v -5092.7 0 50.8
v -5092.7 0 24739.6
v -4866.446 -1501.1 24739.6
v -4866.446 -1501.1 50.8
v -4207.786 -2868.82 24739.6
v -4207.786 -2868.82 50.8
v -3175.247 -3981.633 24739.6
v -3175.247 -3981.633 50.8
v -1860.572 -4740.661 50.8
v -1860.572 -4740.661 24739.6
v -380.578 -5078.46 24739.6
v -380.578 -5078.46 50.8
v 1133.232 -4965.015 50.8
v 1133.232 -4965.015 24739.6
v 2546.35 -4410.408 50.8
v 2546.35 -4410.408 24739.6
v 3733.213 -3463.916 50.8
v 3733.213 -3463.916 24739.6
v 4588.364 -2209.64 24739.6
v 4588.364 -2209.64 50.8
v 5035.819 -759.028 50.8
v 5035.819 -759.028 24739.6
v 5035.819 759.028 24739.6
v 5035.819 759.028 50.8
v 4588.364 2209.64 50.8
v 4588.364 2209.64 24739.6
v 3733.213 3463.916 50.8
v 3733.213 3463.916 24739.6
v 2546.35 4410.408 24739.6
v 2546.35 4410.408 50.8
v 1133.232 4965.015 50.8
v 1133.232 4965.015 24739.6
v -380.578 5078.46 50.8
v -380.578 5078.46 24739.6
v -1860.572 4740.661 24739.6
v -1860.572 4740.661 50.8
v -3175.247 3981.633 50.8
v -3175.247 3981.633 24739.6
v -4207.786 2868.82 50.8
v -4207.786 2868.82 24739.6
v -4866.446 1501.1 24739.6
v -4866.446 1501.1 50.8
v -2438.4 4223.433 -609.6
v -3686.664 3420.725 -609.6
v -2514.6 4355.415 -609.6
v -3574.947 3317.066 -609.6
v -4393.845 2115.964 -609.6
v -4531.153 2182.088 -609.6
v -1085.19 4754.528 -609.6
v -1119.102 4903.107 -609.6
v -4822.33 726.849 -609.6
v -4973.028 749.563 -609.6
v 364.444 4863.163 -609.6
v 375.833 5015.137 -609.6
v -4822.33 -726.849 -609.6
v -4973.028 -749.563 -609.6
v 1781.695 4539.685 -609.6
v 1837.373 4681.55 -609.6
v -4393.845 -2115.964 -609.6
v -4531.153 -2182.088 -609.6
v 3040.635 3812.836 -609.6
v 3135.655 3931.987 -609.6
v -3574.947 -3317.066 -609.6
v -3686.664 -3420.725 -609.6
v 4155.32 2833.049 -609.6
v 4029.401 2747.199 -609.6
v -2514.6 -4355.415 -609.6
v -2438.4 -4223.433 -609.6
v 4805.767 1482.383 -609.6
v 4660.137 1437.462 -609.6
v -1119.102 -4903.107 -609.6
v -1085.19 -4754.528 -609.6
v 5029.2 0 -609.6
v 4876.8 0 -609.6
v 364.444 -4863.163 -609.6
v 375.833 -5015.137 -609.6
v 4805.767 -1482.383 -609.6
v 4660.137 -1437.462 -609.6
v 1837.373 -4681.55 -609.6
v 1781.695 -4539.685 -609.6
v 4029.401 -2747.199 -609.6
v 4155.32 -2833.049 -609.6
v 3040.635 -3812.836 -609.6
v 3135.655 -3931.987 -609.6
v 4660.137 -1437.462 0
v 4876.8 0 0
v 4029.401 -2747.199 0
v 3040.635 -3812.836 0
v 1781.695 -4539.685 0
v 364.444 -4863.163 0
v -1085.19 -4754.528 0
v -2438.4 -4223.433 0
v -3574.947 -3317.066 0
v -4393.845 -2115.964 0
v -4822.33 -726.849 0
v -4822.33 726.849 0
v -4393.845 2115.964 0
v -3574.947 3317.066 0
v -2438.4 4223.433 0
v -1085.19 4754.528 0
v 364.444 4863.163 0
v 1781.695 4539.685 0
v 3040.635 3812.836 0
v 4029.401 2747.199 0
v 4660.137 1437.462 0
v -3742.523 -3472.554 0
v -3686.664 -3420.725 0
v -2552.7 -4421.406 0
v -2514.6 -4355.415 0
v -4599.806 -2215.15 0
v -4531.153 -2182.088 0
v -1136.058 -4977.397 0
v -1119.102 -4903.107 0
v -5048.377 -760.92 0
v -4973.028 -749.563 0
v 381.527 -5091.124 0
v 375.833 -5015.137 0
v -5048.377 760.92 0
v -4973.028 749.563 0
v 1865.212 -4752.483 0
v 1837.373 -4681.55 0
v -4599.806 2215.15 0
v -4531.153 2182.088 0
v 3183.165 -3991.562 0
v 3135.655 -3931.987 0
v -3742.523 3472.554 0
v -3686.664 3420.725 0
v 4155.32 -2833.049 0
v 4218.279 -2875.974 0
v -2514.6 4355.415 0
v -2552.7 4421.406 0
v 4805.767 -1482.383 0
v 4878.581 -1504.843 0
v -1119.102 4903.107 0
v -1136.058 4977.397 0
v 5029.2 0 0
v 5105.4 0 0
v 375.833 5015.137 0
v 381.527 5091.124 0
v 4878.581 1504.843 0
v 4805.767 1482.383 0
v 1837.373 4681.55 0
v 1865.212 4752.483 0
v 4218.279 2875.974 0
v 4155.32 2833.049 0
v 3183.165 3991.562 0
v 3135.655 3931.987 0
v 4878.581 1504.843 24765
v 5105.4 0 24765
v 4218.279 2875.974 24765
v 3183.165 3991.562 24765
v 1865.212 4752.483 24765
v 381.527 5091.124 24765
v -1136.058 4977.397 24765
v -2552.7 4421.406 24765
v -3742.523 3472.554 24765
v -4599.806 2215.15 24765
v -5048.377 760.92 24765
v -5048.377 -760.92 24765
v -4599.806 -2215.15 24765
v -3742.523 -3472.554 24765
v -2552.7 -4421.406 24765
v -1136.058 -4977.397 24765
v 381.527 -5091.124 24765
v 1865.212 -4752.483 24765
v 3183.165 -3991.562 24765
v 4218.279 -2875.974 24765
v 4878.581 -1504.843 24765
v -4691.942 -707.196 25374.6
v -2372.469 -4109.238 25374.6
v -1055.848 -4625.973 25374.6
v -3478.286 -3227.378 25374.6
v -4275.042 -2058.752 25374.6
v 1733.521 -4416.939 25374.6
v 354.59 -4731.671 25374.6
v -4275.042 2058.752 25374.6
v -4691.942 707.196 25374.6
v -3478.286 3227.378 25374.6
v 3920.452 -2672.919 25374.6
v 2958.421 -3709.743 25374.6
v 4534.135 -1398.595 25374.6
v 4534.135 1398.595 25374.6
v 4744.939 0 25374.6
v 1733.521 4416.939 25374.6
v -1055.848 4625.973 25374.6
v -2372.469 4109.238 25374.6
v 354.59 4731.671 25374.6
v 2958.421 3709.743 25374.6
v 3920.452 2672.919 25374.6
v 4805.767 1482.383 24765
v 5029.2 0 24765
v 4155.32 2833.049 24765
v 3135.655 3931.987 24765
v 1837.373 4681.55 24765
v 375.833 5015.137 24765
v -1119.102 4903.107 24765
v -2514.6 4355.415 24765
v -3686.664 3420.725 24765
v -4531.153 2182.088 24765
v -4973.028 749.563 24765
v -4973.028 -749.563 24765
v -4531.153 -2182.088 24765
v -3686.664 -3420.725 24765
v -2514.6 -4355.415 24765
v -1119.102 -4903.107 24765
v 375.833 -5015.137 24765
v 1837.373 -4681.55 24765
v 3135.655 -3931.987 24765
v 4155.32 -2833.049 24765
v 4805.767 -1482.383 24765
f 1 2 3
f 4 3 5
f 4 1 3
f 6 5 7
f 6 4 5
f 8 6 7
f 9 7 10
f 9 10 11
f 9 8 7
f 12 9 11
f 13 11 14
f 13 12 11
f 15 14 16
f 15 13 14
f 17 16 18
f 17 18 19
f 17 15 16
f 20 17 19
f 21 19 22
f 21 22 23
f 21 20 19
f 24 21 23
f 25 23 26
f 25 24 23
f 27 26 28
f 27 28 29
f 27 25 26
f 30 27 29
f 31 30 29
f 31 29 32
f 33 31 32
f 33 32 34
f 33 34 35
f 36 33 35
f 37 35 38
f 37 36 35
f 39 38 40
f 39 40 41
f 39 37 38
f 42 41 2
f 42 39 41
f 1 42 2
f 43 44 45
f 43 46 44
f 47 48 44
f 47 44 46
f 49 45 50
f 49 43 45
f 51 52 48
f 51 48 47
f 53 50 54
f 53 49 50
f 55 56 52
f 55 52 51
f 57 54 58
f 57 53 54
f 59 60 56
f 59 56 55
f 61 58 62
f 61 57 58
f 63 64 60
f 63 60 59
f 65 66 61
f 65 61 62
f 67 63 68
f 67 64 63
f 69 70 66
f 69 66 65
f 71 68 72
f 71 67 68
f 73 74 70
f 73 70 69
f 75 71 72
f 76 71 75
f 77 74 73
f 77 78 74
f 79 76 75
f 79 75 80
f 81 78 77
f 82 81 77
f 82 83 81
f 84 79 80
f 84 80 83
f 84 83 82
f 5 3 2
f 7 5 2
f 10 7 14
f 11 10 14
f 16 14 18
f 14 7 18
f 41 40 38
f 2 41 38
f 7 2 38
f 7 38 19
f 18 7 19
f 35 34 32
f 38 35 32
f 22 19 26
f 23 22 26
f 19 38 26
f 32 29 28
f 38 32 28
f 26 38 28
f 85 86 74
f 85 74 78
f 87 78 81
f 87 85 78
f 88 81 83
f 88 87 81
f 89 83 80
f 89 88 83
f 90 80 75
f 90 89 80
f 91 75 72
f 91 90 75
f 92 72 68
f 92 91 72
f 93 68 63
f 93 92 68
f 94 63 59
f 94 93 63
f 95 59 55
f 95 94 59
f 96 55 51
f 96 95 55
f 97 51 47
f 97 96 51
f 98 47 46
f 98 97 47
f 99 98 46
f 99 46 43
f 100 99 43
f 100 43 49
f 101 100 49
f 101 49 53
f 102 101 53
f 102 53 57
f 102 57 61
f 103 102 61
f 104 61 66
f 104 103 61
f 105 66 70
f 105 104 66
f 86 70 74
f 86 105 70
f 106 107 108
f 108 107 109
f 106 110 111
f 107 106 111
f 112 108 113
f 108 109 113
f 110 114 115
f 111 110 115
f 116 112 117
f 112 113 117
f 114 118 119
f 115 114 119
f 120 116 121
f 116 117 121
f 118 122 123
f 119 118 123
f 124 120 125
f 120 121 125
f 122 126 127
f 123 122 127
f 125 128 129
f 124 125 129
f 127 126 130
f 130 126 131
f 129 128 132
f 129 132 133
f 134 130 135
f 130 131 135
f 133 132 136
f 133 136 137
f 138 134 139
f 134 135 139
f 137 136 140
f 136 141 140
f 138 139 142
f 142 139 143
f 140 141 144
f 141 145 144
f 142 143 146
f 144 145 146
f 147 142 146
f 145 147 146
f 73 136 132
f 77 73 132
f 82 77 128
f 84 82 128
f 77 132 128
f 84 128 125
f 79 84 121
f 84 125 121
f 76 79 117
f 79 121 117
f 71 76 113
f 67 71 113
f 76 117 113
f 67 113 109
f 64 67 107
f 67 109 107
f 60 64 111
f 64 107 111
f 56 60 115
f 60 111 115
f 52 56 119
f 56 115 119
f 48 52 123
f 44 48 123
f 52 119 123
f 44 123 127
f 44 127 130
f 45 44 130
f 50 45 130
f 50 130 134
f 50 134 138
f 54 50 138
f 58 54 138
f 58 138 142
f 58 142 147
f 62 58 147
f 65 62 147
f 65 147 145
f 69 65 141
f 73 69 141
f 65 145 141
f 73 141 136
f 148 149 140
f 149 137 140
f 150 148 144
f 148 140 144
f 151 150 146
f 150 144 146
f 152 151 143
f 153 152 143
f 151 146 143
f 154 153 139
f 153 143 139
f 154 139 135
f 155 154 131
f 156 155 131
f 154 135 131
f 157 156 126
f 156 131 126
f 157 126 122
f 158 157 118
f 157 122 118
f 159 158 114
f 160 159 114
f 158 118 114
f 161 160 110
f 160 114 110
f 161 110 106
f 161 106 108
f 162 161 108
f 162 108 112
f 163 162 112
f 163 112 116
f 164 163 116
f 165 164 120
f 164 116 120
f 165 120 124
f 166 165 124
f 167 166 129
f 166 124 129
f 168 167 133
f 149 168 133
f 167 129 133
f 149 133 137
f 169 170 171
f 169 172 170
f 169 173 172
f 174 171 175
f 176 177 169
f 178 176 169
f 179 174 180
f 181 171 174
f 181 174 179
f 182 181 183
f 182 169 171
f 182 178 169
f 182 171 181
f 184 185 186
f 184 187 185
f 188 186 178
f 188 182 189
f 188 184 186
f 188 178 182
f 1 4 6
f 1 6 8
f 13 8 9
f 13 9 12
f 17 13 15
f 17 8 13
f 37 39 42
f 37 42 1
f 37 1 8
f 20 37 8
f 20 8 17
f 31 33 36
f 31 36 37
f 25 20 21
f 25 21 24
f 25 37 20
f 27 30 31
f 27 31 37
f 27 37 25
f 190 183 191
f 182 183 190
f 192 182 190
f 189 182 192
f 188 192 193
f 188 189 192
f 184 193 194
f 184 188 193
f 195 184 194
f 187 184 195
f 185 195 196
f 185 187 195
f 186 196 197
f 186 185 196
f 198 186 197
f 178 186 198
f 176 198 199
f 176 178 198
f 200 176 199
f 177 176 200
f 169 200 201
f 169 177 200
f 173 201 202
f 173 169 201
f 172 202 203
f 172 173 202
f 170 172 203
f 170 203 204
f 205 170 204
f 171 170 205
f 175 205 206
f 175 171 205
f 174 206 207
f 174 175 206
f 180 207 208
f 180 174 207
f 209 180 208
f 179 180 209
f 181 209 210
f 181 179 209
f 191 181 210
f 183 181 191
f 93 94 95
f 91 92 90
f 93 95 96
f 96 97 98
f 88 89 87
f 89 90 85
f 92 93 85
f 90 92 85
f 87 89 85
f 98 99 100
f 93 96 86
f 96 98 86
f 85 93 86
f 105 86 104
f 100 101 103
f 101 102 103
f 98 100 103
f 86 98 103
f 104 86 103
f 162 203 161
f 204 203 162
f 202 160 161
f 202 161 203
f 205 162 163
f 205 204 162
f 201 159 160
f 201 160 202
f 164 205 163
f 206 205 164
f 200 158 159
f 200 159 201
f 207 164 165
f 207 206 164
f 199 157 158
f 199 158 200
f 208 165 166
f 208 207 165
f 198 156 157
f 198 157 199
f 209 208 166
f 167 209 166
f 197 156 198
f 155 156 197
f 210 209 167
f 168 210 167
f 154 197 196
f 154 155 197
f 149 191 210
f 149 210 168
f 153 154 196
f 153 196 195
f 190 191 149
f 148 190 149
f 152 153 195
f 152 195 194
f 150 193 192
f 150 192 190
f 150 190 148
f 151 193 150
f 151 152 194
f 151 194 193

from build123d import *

# Parameters (mm, degrees)
SKETCH1_R           = 5105.4
BOSS_EXTRUDE1_DEPTH = 50.8
SKETCH2_R           = 5105.4
SKETCH2_R_2         = 5092.7
BOSS_EXTRUDE2_DEPTH = 24688.8
SKETCH3_R           = 5105.4
BOSS_EXTRUDE3_DEPTH = 25.4
SKETCH4_R           = 5029.2
BOSS_EXTRUDE4_DEPTH = 609.6
BOSS_EXTRUDE4_TAPER = 25
SKETCH5_R           = 5029.2
SKETCH5_R_2         = 4876.8
BOSS_EXTRUDE5_DEPTH = 609.6


with BuildPart() as part:
    # Sketch1 → Boss-Extrude1 (new body)
    with BuildSketch(Plane.XY):
        Circle(SKETCH1_R)
    extrude(amount=BOSS_EXTRUDE1_DEPTH)

    # Sketch2 → Boss-Extrude2 (add)
    with BuildSketch(Plane.XY.offset(50.8)):
        Circle(SKETCH2_R)
        with Locations(Location((0, 0, 0), (0, 0, 180))):
            Circle(SKETCH2_R_2, mode=Mode.SUBTRACT)
    extrude(amount=BOSS_EXTRUDE2_DEPTH)

    # Sketch3 → Boss-Extrude3 (add)
    with BuildSketch(Plane.XY.offset(24739.6)):
        Circle(SKETCH3_R)
    extrude(amount=BOSS_EXTRUDE3_DEPTH)

    # Sketch4 → Boss-Extrude4 (add)
    with BuildSketch(Plane.XY.offset(24765)):
        Circle(SKETCH4_R)
    extrude(amount=BOSS_EXTRUDE4_DEPTH, taper=BOSS_EXTRUDE4_TAPER)

    # Sketch5 → Boss-Extrude5 (add)
    with BuildSketch(Plane(origin=(0, 0, 0), x_dir=(-1, 0, 0), z_dir=(0, 0, -1))):
        with Locations(Location((0, 0, 0), (0, 0, 180))):
            Circle(SKETCH5_R)
        with Locations(Location((0, 0, 0), (0, 0, 180))):
            Circle(SKETCH5_R_2, mode=Mode.SUBTRACT)
    extrude(amount=BOSS_EXTRUDE5_DEPTH)


solid = part.part
